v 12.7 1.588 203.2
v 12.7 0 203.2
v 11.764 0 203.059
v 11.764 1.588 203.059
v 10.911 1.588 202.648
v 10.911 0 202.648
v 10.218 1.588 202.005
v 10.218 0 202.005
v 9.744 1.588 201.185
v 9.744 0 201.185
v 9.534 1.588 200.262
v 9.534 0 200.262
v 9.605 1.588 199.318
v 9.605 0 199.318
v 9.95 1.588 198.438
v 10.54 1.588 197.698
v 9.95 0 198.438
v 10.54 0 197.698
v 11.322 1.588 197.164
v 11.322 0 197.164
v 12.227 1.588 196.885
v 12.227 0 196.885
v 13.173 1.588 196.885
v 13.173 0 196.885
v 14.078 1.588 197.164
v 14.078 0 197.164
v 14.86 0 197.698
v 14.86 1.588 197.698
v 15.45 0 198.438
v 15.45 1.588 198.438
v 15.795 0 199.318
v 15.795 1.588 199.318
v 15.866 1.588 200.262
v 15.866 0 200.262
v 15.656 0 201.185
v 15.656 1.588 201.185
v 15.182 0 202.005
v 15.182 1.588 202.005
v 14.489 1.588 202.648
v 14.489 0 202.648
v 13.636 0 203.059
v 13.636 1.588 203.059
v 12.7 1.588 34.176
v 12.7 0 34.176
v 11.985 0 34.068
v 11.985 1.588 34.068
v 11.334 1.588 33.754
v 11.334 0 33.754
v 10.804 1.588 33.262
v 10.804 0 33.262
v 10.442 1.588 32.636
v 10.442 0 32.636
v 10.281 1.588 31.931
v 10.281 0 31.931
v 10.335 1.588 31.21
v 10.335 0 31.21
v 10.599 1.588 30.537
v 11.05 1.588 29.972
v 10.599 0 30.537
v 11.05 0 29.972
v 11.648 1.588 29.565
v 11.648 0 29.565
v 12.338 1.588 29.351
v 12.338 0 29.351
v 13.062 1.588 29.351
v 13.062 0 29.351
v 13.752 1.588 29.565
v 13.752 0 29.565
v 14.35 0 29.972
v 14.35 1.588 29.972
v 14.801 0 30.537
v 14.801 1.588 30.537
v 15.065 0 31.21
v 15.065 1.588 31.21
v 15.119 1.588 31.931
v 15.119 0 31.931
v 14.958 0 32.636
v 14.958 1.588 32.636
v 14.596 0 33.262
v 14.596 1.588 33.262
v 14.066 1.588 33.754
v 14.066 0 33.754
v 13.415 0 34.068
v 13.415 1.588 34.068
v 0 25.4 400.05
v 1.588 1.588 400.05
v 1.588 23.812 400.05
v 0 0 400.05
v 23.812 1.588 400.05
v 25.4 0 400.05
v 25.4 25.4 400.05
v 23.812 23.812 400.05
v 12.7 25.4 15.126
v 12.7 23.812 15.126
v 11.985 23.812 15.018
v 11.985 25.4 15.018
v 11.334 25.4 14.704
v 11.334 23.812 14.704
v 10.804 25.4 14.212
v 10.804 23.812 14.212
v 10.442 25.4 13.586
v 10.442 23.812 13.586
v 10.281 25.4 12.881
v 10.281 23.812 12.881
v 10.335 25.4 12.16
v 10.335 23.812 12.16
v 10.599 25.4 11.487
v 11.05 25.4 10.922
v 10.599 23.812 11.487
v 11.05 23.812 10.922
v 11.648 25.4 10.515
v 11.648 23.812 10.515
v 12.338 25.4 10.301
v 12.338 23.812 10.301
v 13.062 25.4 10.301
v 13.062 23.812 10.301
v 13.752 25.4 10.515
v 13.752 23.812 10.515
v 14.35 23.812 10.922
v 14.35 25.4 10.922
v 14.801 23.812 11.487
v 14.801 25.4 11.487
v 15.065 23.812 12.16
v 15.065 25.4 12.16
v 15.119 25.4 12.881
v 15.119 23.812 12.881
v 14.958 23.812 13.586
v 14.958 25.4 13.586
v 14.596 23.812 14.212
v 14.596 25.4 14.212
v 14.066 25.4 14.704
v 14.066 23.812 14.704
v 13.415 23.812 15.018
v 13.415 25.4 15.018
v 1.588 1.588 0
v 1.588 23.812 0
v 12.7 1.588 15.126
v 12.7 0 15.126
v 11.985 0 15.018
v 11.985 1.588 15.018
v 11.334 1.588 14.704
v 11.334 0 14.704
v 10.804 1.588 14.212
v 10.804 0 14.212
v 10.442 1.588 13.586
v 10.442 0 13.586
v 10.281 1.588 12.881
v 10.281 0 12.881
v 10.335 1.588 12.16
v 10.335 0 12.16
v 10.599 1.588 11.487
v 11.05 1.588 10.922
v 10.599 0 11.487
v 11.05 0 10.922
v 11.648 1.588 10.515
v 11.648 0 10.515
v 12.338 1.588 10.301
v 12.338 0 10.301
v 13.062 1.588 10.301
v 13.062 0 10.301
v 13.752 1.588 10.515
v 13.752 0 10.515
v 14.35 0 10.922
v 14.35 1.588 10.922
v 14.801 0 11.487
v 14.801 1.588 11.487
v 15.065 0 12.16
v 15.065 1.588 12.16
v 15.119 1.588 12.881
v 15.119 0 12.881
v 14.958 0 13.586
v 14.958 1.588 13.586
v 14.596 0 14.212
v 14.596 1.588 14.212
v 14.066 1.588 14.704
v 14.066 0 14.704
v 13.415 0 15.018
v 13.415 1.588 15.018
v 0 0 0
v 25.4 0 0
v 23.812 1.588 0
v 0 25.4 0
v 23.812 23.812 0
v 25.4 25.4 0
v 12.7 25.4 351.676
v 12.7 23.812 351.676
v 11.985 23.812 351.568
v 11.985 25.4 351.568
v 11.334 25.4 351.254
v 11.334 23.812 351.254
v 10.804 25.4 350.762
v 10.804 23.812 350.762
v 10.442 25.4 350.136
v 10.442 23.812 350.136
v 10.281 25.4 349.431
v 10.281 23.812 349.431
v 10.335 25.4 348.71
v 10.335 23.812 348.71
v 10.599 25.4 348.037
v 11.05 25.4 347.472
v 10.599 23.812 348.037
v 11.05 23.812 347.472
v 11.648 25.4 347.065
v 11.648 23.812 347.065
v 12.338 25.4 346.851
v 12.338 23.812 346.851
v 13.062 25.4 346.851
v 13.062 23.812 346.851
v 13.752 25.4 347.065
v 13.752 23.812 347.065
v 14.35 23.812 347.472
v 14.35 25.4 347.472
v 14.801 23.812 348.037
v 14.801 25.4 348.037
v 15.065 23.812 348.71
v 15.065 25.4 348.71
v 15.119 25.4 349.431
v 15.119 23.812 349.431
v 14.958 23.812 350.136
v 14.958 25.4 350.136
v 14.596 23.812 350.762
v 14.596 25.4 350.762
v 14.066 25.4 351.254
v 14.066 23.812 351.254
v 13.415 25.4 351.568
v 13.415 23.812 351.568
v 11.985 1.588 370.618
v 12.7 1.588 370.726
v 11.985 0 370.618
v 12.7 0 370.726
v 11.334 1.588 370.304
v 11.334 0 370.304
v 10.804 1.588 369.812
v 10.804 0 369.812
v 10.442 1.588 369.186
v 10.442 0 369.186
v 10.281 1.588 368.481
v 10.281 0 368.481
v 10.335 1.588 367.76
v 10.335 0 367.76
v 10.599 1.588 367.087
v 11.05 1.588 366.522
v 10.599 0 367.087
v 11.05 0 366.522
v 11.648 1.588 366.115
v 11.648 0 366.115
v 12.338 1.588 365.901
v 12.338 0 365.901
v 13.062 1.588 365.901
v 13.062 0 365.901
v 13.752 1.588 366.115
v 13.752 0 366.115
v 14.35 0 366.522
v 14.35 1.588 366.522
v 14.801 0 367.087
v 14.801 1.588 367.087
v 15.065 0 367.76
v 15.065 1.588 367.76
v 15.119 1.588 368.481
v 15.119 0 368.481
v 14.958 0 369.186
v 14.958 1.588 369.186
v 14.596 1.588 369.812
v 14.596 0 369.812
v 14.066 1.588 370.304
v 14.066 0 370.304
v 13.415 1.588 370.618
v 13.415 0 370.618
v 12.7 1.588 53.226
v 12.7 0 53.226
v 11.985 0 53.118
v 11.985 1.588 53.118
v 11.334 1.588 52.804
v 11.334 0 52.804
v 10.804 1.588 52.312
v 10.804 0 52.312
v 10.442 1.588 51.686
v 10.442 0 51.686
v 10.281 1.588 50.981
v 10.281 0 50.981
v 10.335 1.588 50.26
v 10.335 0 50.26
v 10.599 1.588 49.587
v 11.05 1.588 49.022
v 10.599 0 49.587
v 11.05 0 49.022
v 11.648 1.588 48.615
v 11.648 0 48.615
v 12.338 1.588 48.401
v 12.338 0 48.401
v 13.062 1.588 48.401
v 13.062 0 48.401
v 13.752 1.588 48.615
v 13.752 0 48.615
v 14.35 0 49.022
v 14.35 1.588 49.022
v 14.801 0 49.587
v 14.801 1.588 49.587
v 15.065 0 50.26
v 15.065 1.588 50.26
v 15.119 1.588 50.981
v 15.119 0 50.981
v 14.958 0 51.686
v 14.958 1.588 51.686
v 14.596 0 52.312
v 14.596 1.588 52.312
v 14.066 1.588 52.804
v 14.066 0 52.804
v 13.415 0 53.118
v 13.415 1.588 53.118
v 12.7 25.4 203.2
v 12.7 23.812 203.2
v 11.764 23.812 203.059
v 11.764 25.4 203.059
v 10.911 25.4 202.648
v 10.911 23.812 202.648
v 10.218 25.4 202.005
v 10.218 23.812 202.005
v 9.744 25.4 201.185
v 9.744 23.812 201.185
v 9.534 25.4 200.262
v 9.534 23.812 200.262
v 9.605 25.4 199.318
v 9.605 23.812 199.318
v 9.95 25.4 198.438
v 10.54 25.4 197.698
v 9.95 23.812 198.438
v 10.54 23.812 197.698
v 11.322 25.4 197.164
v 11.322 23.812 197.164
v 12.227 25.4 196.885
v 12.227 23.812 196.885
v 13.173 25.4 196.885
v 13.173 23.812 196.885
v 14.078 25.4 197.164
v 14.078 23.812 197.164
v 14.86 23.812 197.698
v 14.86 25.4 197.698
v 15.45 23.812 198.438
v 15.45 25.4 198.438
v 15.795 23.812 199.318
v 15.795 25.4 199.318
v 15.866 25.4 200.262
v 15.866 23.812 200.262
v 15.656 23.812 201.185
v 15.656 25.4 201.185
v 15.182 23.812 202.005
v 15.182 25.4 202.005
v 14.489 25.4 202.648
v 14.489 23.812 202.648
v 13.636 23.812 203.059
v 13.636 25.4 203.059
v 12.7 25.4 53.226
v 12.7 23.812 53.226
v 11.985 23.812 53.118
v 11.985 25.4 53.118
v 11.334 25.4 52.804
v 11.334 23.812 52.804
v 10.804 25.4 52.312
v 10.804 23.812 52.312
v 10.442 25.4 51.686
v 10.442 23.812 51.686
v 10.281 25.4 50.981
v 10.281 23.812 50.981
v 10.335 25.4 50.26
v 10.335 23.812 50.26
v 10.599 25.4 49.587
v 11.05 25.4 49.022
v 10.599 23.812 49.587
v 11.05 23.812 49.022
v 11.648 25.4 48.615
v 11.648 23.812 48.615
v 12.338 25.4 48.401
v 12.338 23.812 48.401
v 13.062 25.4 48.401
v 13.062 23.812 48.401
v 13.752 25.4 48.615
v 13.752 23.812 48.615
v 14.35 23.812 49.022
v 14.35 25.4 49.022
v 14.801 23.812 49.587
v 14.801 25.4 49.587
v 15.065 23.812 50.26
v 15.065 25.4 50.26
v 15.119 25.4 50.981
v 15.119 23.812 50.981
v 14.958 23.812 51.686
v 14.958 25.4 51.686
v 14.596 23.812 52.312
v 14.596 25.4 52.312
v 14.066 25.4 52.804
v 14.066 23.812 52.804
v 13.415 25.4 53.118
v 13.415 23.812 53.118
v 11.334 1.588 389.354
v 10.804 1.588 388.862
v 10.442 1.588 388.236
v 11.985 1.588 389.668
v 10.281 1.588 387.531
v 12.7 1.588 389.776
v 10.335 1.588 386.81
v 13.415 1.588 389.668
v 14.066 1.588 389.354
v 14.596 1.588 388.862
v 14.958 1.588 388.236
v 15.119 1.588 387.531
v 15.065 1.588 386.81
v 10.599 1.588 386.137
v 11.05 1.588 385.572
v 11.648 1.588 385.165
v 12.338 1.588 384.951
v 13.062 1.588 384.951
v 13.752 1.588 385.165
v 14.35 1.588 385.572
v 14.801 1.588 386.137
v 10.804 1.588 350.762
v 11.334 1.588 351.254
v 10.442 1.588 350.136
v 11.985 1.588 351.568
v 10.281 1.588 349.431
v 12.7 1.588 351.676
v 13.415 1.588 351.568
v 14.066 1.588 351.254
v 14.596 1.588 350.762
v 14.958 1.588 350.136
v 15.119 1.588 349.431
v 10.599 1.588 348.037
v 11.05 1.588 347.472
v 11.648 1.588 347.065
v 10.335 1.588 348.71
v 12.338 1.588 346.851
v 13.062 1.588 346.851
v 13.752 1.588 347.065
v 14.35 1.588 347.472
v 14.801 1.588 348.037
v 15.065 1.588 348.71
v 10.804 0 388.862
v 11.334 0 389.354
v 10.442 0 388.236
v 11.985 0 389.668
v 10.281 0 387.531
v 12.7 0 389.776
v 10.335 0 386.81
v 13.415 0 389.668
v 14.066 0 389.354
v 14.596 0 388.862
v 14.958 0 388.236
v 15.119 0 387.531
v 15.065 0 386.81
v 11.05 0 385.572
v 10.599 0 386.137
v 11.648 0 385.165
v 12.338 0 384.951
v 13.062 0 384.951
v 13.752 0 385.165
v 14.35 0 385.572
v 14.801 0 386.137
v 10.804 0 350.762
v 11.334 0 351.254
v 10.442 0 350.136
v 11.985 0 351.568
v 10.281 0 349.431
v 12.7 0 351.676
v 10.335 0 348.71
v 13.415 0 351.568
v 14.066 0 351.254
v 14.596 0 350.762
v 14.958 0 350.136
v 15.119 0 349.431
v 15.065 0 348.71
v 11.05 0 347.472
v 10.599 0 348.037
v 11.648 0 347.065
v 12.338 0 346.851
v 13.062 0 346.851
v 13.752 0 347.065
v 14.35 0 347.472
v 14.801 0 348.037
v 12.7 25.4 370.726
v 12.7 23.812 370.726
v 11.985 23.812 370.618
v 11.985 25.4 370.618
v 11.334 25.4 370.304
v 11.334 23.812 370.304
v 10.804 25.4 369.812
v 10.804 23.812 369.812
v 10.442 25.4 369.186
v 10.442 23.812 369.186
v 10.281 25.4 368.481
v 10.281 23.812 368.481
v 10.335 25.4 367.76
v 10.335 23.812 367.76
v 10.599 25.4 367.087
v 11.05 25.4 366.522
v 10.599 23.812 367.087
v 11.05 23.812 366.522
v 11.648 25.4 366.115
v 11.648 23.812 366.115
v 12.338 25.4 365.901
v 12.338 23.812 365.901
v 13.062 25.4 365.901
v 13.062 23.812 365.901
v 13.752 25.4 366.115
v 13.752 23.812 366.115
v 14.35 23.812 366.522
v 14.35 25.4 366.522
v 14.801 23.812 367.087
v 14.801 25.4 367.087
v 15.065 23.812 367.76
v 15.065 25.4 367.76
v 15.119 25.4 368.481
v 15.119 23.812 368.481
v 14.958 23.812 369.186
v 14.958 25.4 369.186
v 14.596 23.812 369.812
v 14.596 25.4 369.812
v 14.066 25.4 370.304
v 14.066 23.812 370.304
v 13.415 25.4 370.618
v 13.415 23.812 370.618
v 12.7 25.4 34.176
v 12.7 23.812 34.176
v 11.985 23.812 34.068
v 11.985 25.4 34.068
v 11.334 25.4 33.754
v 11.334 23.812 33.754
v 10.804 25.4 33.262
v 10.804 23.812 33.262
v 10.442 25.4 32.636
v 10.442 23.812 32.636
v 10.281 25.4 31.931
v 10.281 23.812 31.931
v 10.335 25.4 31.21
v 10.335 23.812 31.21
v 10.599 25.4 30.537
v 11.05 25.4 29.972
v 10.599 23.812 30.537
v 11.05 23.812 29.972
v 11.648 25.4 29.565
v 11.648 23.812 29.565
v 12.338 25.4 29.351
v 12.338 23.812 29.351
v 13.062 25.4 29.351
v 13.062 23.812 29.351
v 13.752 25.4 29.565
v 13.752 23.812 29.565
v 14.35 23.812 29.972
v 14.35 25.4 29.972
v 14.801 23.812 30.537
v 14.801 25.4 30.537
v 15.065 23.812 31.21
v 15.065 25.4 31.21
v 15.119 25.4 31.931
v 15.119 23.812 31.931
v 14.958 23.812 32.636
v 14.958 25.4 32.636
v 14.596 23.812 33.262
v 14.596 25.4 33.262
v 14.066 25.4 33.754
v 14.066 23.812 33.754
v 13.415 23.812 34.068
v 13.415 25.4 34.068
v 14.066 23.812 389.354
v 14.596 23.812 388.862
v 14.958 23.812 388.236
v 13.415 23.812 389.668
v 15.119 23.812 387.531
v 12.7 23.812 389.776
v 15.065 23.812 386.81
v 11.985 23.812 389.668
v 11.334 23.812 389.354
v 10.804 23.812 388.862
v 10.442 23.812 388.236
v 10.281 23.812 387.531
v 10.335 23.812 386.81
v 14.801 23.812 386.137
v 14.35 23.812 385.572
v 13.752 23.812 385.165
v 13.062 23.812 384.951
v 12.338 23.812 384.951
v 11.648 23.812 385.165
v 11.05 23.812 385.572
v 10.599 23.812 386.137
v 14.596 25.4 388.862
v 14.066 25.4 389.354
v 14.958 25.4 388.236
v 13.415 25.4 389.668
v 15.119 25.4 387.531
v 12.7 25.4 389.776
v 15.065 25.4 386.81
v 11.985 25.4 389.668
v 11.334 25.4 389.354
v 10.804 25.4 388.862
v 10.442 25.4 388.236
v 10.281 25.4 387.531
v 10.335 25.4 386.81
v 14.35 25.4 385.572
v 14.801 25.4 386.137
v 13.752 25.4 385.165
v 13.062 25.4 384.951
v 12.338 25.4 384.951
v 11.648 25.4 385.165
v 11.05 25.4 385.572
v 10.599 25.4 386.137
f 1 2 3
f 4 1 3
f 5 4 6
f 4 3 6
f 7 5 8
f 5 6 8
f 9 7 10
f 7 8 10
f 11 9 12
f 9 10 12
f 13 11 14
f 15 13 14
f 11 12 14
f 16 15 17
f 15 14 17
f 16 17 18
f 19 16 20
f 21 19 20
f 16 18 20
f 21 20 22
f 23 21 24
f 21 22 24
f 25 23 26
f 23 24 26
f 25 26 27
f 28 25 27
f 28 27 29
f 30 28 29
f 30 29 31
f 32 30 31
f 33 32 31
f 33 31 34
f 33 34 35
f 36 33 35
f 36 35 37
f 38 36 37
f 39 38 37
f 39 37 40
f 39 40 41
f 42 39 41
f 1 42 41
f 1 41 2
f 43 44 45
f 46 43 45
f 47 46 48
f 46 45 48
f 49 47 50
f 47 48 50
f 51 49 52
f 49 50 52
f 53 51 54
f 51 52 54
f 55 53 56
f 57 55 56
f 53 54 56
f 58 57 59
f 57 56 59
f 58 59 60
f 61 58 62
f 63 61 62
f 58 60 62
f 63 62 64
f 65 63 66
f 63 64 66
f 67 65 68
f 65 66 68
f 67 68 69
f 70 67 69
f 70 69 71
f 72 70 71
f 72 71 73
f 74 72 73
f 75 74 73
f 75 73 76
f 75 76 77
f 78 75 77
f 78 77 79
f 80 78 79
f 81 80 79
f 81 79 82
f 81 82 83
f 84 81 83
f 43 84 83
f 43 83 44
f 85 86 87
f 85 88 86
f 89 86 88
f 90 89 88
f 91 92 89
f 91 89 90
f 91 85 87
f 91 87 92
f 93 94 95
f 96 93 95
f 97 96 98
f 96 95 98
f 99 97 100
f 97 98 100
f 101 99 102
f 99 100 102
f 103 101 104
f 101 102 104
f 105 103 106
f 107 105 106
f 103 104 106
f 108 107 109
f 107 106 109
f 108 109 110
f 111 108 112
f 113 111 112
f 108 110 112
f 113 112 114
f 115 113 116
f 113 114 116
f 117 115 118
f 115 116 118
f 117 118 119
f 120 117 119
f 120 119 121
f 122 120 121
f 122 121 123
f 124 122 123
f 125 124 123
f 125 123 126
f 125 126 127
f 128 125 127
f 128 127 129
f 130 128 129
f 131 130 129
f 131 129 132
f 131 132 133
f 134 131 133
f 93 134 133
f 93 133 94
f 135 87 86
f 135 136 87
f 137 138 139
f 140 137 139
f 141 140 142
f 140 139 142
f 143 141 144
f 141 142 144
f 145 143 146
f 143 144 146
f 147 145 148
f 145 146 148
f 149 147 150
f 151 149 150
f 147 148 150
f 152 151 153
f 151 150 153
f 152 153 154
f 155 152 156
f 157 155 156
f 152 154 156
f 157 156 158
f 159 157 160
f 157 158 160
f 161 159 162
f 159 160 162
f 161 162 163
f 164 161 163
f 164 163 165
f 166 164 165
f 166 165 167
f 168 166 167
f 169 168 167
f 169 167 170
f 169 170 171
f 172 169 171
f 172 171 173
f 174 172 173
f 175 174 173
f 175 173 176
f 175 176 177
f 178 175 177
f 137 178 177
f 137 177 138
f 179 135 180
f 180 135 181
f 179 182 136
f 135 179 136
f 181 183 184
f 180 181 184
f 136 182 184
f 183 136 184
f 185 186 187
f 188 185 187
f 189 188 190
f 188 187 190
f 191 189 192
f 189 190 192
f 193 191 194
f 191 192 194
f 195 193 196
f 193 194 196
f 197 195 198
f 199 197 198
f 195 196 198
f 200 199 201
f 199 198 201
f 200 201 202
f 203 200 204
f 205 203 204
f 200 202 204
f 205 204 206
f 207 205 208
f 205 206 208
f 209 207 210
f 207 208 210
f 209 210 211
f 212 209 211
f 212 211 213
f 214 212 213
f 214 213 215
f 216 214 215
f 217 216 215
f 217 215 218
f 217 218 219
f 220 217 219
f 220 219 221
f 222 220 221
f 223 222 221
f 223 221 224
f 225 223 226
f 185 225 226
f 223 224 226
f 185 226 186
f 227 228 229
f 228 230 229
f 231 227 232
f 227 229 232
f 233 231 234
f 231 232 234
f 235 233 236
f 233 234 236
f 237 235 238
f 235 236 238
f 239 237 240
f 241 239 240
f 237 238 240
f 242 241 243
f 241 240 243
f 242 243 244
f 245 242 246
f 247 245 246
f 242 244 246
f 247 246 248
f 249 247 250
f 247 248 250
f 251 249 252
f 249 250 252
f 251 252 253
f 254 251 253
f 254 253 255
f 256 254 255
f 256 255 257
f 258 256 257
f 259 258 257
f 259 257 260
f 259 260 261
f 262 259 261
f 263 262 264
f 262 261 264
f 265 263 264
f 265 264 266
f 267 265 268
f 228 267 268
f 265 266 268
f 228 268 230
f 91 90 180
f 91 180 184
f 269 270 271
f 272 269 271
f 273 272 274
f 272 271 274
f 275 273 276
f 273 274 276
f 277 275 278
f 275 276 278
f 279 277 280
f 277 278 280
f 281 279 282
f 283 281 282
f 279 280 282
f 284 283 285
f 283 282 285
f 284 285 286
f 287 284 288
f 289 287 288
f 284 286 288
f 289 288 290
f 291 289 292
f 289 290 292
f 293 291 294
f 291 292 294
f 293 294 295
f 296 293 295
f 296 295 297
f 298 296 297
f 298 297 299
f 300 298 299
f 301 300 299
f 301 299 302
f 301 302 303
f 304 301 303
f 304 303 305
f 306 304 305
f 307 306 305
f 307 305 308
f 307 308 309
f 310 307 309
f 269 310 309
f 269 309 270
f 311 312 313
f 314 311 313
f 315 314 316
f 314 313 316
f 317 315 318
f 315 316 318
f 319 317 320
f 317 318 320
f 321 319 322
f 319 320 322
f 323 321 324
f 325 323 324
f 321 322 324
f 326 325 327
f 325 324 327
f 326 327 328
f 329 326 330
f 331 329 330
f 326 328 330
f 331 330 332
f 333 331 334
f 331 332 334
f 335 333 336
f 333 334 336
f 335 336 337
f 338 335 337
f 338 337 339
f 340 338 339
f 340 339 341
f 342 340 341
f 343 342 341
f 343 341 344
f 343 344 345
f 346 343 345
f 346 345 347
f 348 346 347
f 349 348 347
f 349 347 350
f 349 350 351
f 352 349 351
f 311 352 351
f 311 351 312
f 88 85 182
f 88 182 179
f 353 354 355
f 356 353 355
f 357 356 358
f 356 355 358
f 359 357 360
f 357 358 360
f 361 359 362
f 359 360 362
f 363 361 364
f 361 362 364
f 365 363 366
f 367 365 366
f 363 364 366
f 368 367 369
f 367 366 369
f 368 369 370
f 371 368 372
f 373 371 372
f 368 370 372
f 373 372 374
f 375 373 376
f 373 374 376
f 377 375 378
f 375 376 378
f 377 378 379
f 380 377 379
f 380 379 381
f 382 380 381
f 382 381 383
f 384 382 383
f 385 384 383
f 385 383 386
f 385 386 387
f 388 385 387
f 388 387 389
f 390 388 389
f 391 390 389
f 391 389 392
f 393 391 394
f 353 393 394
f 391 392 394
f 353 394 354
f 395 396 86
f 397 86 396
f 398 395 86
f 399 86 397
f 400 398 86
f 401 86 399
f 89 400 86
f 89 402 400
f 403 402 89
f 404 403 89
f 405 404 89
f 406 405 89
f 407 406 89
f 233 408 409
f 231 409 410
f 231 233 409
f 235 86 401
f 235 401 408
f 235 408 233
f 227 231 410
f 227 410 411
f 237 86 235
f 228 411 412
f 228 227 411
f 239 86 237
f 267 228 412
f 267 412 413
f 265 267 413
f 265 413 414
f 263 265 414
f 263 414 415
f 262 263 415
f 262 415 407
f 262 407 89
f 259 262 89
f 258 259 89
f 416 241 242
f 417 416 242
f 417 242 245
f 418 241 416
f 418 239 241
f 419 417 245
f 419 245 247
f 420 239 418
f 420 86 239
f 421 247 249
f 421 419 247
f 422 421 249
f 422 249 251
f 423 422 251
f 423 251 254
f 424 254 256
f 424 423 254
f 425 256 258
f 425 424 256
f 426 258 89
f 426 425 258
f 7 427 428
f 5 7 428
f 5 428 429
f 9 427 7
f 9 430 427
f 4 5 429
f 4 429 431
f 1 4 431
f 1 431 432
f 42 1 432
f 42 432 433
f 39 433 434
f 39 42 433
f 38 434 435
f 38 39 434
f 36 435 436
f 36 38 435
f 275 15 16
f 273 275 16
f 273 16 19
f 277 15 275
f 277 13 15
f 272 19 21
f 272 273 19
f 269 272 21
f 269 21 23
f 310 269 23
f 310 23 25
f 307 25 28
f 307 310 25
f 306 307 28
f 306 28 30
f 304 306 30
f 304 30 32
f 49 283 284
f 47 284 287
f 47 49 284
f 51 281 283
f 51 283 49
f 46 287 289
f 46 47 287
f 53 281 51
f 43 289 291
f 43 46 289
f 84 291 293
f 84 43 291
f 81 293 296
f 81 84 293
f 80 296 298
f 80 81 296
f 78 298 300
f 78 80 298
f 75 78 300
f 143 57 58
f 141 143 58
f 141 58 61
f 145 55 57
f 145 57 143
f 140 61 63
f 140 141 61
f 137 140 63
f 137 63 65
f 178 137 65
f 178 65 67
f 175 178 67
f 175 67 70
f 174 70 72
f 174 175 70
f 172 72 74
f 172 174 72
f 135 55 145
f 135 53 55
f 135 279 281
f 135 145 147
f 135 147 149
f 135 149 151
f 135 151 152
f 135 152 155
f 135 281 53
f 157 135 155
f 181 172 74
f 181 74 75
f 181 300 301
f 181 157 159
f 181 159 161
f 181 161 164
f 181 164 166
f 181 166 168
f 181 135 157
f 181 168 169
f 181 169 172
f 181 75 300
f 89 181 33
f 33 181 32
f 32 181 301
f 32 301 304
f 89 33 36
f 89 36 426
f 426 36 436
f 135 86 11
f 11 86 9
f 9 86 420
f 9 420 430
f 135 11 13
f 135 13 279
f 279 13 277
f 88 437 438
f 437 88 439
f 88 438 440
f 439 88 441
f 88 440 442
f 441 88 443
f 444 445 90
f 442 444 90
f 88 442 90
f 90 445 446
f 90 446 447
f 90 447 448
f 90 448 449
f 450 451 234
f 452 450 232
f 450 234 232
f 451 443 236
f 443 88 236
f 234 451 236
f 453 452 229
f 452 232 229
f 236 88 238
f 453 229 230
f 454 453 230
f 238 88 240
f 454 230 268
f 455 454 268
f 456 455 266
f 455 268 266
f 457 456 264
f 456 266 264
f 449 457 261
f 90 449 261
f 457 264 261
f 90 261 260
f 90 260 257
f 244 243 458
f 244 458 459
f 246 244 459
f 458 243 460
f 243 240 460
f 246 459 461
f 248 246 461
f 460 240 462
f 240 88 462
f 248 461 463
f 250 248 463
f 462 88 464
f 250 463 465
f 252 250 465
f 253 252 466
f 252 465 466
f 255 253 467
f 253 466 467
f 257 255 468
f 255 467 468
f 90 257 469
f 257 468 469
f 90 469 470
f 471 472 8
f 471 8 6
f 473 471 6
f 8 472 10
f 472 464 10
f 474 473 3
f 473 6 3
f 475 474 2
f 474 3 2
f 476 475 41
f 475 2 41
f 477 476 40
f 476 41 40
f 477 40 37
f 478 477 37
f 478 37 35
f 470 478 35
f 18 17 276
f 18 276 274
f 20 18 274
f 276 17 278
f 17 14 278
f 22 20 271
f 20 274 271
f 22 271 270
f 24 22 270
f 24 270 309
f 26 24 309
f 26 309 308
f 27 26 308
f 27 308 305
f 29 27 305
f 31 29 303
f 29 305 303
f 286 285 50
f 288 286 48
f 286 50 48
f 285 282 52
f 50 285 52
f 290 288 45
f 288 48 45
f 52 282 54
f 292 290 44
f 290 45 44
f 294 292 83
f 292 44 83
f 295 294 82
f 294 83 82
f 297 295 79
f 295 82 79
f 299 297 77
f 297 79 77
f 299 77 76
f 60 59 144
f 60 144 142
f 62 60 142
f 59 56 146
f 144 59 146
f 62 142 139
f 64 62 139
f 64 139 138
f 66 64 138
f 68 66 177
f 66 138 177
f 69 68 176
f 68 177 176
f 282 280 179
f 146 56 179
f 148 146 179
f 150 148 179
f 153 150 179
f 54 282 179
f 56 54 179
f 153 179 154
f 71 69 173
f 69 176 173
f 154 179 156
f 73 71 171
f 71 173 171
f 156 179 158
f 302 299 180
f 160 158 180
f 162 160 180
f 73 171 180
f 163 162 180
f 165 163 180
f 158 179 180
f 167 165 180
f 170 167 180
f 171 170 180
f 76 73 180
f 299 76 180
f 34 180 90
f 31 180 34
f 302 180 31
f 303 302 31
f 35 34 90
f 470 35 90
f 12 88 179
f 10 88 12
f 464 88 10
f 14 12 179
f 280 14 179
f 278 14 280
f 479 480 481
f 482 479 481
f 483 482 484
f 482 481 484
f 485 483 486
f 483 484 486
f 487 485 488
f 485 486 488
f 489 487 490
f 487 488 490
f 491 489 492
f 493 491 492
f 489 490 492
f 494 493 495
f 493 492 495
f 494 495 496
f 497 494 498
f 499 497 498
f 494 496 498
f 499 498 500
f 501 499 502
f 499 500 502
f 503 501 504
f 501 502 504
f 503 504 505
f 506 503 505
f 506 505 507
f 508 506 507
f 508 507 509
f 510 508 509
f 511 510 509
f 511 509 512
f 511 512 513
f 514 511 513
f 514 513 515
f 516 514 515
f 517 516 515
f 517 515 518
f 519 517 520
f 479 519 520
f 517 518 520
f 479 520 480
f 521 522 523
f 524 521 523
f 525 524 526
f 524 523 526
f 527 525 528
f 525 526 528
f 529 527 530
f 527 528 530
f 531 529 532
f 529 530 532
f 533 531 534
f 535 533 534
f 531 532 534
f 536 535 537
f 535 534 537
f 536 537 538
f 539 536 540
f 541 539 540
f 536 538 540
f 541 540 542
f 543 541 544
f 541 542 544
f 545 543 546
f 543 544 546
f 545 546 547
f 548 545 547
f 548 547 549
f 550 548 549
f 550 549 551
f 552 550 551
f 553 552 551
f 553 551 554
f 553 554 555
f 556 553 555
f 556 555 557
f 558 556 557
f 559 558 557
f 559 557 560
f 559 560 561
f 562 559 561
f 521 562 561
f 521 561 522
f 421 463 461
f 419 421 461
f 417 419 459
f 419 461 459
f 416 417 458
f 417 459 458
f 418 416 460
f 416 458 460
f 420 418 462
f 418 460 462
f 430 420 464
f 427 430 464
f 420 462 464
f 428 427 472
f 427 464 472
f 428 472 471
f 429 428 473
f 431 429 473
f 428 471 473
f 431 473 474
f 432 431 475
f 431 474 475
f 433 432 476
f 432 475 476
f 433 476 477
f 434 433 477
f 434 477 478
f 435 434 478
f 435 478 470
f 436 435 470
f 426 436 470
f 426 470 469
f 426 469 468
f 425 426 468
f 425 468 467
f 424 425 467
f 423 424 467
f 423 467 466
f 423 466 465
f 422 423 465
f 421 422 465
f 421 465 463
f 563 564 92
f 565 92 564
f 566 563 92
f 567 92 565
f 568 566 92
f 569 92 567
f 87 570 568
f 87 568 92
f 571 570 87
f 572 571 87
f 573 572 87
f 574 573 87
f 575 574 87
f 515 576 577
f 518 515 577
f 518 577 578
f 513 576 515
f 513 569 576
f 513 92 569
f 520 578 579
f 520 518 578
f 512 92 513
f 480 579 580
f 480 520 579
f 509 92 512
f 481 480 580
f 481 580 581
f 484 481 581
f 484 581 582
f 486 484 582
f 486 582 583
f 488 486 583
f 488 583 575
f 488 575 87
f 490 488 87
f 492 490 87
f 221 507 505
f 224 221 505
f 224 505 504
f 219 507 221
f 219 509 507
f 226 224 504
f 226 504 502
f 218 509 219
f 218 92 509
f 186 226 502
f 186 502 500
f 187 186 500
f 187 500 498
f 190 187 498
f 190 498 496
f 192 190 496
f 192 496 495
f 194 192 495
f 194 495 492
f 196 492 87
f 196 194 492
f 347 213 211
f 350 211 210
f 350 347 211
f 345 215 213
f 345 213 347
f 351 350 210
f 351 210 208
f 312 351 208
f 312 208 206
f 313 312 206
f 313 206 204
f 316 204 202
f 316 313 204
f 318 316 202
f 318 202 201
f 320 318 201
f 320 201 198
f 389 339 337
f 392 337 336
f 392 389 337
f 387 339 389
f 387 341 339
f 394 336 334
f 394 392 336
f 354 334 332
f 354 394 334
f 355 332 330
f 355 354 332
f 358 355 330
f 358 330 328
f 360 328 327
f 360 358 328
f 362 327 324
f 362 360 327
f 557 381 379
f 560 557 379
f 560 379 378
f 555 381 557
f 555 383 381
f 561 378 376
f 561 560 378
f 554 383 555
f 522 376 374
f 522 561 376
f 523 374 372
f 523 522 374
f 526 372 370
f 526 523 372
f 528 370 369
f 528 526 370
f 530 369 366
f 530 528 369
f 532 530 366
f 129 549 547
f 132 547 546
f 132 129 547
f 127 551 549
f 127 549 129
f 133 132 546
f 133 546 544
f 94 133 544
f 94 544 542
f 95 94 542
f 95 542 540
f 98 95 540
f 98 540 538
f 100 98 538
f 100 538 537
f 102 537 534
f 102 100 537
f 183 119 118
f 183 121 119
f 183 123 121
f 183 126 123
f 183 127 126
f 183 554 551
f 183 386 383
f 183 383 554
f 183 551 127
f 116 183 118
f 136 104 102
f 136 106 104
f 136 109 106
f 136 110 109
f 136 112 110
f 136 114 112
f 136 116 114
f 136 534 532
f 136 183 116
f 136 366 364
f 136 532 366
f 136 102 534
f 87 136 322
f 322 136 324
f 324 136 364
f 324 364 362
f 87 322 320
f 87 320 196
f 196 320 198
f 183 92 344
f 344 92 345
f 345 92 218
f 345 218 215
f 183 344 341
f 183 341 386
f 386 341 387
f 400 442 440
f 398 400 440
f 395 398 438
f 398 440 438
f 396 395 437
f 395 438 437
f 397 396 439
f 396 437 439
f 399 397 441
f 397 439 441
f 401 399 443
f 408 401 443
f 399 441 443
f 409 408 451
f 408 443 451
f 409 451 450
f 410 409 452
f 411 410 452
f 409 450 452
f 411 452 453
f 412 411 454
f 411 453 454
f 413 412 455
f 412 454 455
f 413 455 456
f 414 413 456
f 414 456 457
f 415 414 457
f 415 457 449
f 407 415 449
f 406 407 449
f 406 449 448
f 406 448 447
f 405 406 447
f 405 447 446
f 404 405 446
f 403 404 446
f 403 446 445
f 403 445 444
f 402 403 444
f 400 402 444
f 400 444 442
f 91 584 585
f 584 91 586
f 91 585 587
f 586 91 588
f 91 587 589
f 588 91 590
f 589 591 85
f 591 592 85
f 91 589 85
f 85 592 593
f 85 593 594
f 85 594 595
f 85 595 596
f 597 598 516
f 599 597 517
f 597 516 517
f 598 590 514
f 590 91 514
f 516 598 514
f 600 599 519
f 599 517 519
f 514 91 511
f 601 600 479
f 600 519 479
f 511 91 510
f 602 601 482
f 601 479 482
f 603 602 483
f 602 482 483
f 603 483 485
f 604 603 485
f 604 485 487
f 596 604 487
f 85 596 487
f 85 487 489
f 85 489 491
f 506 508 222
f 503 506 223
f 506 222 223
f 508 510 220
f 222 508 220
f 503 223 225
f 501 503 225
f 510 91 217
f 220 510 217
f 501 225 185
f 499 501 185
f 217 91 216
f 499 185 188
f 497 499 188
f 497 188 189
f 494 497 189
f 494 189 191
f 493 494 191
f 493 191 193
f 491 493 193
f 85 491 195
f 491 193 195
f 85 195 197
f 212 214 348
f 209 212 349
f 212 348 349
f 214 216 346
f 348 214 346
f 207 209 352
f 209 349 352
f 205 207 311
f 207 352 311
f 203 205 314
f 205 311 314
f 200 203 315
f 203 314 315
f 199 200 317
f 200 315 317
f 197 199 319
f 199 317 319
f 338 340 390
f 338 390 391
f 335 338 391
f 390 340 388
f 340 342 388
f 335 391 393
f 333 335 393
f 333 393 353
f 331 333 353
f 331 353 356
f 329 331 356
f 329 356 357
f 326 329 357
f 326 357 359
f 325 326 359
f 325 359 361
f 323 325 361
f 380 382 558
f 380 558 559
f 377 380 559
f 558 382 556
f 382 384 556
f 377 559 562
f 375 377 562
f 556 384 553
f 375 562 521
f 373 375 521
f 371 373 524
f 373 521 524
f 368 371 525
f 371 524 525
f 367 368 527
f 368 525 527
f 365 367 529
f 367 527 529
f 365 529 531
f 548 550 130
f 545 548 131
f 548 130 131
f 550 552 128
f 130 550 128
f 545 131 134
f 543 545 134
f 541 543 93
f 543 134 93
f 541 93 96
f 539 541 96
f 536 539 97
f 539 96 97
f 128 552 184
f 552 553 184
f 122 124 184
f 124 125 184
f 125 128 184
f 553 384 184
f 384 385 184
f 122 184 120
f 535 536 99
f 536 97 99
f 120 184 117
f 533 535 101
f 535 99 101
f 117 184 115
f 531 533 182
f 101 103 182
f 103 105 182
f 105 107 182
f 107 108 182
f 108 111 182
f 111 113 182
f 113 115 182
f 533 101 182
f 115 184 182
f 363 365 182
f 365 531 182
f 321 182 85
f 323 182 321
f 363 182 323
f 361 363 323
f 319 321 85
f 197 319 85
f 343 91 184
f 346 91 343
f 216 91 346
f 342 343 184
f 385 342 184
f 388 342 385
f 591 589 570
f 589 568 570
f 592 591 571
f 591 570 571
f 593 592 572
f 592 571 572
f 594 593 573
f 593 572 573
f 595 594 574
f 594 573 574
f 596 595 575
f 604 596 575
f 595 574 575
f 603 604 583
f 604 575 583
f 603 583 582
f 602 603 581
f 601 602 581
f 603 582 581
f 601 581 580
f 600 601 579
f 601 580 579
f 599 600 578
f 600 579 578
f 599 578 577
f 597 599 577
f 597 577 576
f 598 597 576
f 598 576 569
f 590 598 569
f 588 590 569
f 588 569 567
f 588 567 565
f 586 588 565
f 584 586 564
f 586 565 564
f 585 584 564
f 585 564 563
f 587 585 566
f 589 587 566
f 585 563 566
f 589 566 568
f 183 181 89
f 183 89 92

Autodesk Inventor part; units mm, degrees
ref_plane "YZ Plane" through (0, 0, 0) normal (1, 0, 0) x (0, 1, 0)
ref_plane "XZ Plane" through (0, 0, 0) normal (0, 1, 0) x (-1, 0, 0)
ref_plane "XY Plane" through (0, 0, 0) normal (0, 0, 1) x (1, 0, 0)
sketch "Sketch1" plane through (0, 0, 0) normal (0, 0, 1) x (1, 0, 0)
  line L0 (0, 0) -> (25.4, 0)
  line L1 (25.4, 0) -> (25.4, 25.4)
  line L2 (25.4, 25.4) -> (0, 25.4)
  line L3 (0, 25.4) -> (0, 0)
  line L4 (1.5875, 1.5875) -> (23.8125, 1.5875)
  line L5 (23.8125, 1.5875) -> (23.8125, 23.8125)
  line L6 (23.8125, 23.8125) -> (1.5875, 23.8125)
  line L7 (1.5875, 23.8125) -> (1.5875, 1.5875)
  dimension "d0" = 25.4
  dimension "d1" = 25.4
  dimension "d2" = 1.5875
extrude "Extrusion1" add sketch "Sketch1" along normal blind 400.05
sketch "Sketch3" plane through (0, 25.4, 0) normal (0, 1, 0) x (1, 0, 0)
  line L0 (25.4, 0) -> (0, 0) projected
  line L1 (0, 0) -> (0, -400.05) projected
  line L2 (25.4, -400.05) -> (0, -400.05) projected
  line L3 (25.4, 0) -> (25.4, -400.05) projected
  point P0 (0, 0)
  point P1 (12.7, -200.025)
  dimension "d15" = 200.025
  dimension "d16" = 400.05
  dimension "d17" = 12.7
hole "Hole2" at (12.7, 25.4, 200.025) direction (0, -1, 0) diameter 6.35 end through all clearance for "Flat Head Machine Screw (82)" size "1/4" standard "Ansi Unified Screw Threads"
sketch "Sketch5" plane through (0, 25.4, 0) normal (0, 1, 0) x (1, 0, 0)
  line L0 (0, 0) -> (0, -400.05) projected
  line L1 (25.4, -400.05) -> (0, -400.05) projected
  point P0 (12.7, -387.35)
  dimension "d25" = 12.7
  dimension "d26" = 12.7
hole "Hole3" at (12.7, 25.4, 387.35) direction (0, -1, 0) diameter 4.8514 end through all
pattern_linear "Rectangular Pattern1" count 3 spacing 19.05 along (0, 0, -1) of "Hole3"
sketch "Sketch6" plane through (0, 25.4, 0) normal (0, 1, 0) x (1, 0, 0)
  line L0 (25.4, 0) -> (0, 0) projected
  line L1 (25.4, 0) -> (25.4, -400.05) projected
  point P0 (12.7, -12.7)
  dimension "d37" = 12.7
  dimension "d38" = 12.7
hole "Hole4" at (12.7, 25.4, 12.7) direction (0, -1, 0) diameter 4.8514 end through all
pattern_linear "Rectangular Pattern2" count 3 spacing 19.05 along (0, 0, 1) of "Hole4"
equation "\"d15\" = 0.5 * d16"
properties part number "CLB_043_FourPartScissorBarMiddle" material "Aluminum 6061"
